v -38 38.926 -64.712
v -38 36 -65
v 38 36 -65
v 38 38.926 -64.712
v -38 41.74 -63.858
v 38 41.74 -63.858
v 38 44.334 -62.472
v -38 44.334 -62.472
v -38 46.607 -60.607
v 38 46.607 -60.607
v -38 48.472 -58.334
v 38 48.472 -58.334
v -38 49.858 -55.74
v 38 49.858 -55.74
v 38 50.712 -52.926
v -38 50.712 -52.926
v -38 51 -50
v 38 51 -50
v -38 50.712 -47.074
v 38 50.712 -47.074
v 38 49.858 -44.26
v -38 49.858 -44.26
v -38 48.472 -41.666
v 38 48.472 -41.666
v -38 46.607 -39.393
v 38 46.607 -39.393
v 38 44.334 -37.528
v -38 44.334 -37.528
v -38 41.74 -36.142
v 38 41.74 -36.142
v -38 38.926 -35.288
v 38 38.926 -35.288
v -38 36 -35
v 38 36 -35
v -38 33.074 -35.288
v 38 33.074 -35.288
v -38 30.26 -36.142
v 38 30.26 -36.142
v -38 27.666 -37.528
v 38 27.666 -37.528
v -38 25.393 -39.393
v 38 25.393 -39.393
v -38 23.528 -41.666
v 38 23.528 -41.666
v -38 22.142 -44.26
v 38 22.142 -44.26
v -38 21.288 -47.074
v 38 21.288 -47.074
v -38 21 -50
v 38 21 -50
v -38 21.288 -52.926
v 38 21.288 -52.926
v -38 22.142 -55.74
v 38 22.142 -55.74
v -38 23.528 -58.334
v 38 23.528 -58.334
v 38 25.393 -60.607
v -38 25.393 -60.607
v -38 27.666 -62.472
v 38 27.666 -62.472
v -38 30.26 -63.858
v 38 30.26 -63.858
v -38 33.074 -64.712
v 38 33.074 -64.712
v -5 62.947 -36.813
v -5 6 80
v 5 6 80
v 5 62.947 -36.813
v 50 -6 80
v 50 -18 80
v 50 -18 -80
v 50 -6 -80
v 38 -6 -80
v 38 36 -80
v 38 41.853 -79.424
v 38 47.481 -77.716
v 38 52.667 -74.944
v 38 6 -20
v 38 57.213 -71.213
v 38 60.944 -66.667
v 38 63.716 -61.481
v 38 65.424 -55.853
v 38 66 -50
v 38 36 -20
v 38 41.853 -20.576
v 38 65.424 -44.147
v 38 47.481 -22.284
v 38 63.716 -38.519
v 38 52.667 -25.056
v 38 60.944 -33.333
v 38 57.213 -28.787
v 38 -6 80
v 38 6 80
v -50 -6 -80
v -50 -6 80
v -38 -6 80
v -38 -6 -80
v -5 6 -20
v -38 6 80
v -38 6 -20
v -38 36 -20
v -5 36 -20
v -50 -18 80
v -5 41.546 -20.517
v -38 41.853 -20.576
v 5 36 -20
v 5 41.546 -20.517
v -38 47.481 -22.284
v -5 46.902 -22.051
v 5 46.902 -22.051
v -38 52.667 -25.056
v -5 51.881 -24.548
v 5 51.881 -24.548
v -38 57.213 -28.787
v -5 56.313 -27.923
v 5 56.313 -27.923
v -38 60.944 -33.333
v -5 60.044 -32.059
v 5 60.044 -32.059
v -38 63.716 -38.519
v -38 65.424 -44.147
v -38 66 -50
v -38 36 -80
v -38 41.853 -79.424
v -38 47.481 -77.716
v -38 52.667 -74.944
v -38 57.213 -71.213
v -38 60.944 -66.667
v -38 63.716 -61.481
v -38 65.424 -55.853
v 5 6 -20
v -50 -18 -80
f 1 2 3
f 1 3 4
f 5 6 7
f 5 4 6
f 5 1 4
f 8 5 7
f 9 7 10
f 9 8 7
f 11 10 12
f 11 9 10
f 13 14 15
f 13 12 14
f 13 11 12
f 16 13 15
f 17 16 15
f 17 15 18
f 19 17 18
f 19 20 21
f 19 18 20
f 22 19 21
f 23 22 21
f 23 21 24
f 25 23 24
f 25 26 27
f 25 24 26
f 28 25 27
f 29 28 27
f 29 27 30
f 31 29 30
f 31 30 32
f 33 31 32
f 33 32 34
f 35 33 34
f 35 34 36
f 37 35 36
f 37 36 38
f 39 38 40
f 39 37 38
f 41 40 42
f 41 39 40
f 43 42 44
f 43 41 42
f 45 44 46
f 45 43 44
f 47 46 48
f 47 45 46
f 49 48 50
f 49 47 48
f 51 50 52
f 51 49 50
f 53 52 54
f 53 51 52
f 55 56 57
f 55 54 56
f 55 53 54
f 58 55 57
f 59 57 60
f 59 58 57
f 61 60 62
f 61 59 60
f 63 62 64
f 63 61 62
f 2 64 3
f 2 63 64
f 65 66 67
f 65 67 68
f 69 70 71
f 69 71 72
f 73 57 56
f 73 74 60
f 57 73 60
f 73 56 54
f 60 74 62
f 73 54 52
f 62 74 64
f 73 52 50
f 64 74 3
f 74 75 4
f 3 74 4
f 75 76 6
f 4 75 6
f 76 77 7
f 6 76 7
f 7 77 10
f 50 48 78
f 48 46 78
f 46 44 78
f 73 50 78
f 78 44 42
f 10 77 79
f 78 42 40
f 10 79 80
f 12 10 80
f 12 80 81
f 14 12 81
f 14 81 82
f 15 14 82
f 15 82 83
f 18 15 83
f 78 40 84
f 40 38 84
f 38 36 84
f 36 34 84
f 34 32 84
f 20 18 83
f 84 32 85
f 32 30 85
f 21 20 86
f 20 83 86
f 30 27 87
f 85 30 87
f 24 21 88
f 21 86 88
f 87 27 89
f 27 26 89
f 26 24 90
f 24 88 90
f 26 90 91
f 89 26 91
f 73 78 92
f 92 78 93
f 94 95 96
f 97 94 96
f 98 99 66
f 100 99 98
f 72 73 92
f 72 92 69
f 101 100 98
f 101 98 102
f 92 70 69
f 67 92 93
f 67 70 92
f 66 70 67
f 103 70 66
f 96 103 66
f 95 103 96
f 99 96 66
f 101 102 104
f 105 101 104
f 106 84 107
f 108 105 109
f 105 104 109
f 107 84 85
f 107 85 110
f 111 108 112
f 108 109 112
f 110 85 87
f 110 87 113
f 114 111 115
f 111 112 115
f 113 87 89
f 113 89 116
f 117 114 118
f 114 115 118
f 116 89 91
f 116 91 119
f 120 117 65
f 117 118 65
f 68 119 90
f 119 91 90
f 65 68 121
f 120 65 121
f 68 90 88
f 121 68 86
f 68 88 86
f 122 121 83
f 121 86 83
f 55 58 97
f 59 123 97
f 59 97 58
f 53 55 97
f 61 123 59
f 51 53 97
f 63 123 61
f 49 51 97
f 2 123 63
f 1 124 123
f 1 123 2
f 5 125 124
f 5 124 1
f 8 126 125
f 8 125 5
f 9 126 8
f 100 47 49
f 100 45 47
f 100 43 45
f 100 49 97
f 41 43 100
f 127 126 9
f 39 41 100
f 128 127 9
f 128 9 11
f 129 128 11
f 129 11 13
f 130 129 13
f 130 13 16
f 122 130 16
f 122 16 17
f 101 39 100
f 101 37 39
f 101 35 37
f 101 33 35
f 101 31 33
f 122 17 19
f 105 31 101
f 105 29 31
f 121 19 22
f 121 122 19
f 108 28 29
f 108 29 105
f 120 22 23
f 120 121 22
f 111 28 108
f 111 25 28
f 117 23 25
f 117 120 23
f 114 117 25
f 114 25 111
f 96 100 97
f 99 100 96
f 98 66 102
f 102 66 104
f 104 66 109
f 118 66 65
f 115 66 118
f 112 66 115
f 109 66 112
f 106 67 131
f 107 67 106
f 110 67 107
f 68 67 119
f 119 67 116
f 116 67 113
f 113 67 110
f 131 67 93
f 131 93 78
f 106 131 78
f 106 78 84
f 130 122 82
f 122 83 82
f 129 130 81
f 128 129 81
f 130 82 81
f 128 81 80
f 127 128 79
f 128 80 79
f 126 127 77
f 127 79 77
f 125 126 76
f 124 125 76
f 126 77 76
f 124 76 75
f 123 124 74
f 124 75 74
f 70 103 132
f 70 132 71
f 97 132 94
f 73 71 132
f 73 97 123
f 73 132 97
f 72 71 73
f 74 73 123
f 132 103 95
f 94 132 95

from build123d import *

# Parameters (mm, degrees)
BOSS_EXTRUDE2_DEPTH             = 38
BOSS_EXTRUDE2_DEPTH_BACK        = 38
FILLET1_R                       = 30
CUT_EXTRUDE1_DEPTH              = 111.453610172
CUT_EXTRUDE1_DEPTH_BACK         = 111.453610172
SKETCH3_R                       = 15
BOSS_EXTRUDE3_REACH             = 112.454
SKETCH5_W                       = 100
SKETCH5_H                       = 12
BOSS_EXTRUDE3_DIRECTION_2_REACH = 112.454
RIB1_REACH                      = 117.135
SKETCH7_WALL_W                  = 362.269405062
SKETCH7_WALL_H                  = 10


with BuildPart() as part:
    # Sketch2 → Boss-Extrude2 (new, two sides: drawn at the far end of the back side and taken through both)
    with BuildSketch(Plane(origin=(0, 0, 0), x_dir=(0, 0, -1), z_dir=(1, 0, 0)).offset(-BOSS_EXTRUDE2_DEPTH_BACK)):
        Polygon((-80, 6), (20, 6), (20, 66), (80, 66), (80, 6), (80, -6), (-80, -6), align=None)
    extrude(amount=BOSS_EXTRUDE2_DEPTH + BOSS_EXTRUDE2_DEPTH_BACK)

    # Fillet1
    fillet1_edges = [part.edges().sort_by_distance(p)[0] for p in [
        (0, 66, -80),
        (0, 66, -20),
    ]]
    fillet(fillet1_edges, radius=FILLET1_R - 0.0001)  # a hair under: the kernel refuses the full size

    # Sketch3 → Cut-Extrude1 (cut, two sides: drawn at the far end of the back side and taken through both)
    with BuildSketch(Plane(origin=(0, 0, 0), x_dir=(0, 0, -1), z_dir=(1, 0, 0)).offset(-CUT_EXTRUDE1_DEPTH_BACK)):
        with Locations((50, 36)):
            Circle(SKETCH3_R)
    extrude(amount=CUT_EXTRUDE1_DEPTH + CUT_EXTRUDE1_DEPTH_BACK, mode=Mode.SUBTRACT)

    # Boss-Extrude3: up to this face of the body (flat: up to its plane)
    boss_extrude3_end = Plane(part.part.faces().sort_by_distance((0, 0, 80))[0])
    # Sketch5 → Boss-Extrude3 (add, up to the picked face)
    with BuildSketch(Plane.XY, mode=Mode.PRIVATE) as boss_extrude3_sk1:
        with Locations((0, -12)):
            Rectangle(SKETCH5_W, SKETCH5_H)
    boss_extrude3_tool1 = split(extrude(boss_extrude3_sk1.sketch, amount=BOSS_EXTRUDE3_REACH, mode=Mode.PRIVATE), bisect_by=boss_extrude3_end, keep=Keep.BOTH, mode=Mode.PRIVATE)
    add(boss_extrude3_tool1.solids().sort_by(Axis((0, -12, 0), (0, 0, 1)))[0])

    # Boss-Extrude3 direction 2: up to this face of the body (flat: up to its plane)
    boss_extrude3_direction_2_end = Plane(part.part.faces().sort_by_distance((0, 15.00005, -80))[0])
    # Sketch5 → Boss-Extrude3 direction 2 (add, up to the picked face)
    with BuildSketch(Plane.XY, mode=Mode.PRIVATE) as boss_extrude3_direction_2_sk1:
        with Locations((0, -12)):
            Rectangle(SKETCH5_W, SKETCH5_H)
    boss_extrude3_direction_2_tool1 = split(extrude(boss_extrude3_direction_2_sk1.sketch, amount=-BOSS_EXTRUDE3_DIRECTION_2_REACH, mode=Mode.PRIVATE), bisect_by=boss_extrude3_direction_2_end, keep=Keep.BOTH, mode=Mode.PRIVATE)
    add(boss_extrude3_direction_2_tool1.solids().sort_by(Axis((0, -12, 0), (0, 0, -1)))[0])

    # Sketch7 wall → Rib1 (add, up to next)
    with BuildSketch(Plane(origin=(0, 34.483145548, 21.573034774), x_dir=(0, 0.438202247192, -0.898876404494), z_dir=(0, 0.898876404494, 0.438202247192)), mode=Mode.PRIVATE) as rib1_sk1:
        Rectangle(SKETCH7_WALL_W, SKETCH7_WALL_H)
    rib1_tool1 = extrude(rib1_sk1.sketch, amount=-RIB1_REACH, mode=Mode.PRIVATE) - part.part
    add(rib1_tool1.solids().sort_by_distance((0, 34.483145548, 21.573034774))[0])


solid = part.part
